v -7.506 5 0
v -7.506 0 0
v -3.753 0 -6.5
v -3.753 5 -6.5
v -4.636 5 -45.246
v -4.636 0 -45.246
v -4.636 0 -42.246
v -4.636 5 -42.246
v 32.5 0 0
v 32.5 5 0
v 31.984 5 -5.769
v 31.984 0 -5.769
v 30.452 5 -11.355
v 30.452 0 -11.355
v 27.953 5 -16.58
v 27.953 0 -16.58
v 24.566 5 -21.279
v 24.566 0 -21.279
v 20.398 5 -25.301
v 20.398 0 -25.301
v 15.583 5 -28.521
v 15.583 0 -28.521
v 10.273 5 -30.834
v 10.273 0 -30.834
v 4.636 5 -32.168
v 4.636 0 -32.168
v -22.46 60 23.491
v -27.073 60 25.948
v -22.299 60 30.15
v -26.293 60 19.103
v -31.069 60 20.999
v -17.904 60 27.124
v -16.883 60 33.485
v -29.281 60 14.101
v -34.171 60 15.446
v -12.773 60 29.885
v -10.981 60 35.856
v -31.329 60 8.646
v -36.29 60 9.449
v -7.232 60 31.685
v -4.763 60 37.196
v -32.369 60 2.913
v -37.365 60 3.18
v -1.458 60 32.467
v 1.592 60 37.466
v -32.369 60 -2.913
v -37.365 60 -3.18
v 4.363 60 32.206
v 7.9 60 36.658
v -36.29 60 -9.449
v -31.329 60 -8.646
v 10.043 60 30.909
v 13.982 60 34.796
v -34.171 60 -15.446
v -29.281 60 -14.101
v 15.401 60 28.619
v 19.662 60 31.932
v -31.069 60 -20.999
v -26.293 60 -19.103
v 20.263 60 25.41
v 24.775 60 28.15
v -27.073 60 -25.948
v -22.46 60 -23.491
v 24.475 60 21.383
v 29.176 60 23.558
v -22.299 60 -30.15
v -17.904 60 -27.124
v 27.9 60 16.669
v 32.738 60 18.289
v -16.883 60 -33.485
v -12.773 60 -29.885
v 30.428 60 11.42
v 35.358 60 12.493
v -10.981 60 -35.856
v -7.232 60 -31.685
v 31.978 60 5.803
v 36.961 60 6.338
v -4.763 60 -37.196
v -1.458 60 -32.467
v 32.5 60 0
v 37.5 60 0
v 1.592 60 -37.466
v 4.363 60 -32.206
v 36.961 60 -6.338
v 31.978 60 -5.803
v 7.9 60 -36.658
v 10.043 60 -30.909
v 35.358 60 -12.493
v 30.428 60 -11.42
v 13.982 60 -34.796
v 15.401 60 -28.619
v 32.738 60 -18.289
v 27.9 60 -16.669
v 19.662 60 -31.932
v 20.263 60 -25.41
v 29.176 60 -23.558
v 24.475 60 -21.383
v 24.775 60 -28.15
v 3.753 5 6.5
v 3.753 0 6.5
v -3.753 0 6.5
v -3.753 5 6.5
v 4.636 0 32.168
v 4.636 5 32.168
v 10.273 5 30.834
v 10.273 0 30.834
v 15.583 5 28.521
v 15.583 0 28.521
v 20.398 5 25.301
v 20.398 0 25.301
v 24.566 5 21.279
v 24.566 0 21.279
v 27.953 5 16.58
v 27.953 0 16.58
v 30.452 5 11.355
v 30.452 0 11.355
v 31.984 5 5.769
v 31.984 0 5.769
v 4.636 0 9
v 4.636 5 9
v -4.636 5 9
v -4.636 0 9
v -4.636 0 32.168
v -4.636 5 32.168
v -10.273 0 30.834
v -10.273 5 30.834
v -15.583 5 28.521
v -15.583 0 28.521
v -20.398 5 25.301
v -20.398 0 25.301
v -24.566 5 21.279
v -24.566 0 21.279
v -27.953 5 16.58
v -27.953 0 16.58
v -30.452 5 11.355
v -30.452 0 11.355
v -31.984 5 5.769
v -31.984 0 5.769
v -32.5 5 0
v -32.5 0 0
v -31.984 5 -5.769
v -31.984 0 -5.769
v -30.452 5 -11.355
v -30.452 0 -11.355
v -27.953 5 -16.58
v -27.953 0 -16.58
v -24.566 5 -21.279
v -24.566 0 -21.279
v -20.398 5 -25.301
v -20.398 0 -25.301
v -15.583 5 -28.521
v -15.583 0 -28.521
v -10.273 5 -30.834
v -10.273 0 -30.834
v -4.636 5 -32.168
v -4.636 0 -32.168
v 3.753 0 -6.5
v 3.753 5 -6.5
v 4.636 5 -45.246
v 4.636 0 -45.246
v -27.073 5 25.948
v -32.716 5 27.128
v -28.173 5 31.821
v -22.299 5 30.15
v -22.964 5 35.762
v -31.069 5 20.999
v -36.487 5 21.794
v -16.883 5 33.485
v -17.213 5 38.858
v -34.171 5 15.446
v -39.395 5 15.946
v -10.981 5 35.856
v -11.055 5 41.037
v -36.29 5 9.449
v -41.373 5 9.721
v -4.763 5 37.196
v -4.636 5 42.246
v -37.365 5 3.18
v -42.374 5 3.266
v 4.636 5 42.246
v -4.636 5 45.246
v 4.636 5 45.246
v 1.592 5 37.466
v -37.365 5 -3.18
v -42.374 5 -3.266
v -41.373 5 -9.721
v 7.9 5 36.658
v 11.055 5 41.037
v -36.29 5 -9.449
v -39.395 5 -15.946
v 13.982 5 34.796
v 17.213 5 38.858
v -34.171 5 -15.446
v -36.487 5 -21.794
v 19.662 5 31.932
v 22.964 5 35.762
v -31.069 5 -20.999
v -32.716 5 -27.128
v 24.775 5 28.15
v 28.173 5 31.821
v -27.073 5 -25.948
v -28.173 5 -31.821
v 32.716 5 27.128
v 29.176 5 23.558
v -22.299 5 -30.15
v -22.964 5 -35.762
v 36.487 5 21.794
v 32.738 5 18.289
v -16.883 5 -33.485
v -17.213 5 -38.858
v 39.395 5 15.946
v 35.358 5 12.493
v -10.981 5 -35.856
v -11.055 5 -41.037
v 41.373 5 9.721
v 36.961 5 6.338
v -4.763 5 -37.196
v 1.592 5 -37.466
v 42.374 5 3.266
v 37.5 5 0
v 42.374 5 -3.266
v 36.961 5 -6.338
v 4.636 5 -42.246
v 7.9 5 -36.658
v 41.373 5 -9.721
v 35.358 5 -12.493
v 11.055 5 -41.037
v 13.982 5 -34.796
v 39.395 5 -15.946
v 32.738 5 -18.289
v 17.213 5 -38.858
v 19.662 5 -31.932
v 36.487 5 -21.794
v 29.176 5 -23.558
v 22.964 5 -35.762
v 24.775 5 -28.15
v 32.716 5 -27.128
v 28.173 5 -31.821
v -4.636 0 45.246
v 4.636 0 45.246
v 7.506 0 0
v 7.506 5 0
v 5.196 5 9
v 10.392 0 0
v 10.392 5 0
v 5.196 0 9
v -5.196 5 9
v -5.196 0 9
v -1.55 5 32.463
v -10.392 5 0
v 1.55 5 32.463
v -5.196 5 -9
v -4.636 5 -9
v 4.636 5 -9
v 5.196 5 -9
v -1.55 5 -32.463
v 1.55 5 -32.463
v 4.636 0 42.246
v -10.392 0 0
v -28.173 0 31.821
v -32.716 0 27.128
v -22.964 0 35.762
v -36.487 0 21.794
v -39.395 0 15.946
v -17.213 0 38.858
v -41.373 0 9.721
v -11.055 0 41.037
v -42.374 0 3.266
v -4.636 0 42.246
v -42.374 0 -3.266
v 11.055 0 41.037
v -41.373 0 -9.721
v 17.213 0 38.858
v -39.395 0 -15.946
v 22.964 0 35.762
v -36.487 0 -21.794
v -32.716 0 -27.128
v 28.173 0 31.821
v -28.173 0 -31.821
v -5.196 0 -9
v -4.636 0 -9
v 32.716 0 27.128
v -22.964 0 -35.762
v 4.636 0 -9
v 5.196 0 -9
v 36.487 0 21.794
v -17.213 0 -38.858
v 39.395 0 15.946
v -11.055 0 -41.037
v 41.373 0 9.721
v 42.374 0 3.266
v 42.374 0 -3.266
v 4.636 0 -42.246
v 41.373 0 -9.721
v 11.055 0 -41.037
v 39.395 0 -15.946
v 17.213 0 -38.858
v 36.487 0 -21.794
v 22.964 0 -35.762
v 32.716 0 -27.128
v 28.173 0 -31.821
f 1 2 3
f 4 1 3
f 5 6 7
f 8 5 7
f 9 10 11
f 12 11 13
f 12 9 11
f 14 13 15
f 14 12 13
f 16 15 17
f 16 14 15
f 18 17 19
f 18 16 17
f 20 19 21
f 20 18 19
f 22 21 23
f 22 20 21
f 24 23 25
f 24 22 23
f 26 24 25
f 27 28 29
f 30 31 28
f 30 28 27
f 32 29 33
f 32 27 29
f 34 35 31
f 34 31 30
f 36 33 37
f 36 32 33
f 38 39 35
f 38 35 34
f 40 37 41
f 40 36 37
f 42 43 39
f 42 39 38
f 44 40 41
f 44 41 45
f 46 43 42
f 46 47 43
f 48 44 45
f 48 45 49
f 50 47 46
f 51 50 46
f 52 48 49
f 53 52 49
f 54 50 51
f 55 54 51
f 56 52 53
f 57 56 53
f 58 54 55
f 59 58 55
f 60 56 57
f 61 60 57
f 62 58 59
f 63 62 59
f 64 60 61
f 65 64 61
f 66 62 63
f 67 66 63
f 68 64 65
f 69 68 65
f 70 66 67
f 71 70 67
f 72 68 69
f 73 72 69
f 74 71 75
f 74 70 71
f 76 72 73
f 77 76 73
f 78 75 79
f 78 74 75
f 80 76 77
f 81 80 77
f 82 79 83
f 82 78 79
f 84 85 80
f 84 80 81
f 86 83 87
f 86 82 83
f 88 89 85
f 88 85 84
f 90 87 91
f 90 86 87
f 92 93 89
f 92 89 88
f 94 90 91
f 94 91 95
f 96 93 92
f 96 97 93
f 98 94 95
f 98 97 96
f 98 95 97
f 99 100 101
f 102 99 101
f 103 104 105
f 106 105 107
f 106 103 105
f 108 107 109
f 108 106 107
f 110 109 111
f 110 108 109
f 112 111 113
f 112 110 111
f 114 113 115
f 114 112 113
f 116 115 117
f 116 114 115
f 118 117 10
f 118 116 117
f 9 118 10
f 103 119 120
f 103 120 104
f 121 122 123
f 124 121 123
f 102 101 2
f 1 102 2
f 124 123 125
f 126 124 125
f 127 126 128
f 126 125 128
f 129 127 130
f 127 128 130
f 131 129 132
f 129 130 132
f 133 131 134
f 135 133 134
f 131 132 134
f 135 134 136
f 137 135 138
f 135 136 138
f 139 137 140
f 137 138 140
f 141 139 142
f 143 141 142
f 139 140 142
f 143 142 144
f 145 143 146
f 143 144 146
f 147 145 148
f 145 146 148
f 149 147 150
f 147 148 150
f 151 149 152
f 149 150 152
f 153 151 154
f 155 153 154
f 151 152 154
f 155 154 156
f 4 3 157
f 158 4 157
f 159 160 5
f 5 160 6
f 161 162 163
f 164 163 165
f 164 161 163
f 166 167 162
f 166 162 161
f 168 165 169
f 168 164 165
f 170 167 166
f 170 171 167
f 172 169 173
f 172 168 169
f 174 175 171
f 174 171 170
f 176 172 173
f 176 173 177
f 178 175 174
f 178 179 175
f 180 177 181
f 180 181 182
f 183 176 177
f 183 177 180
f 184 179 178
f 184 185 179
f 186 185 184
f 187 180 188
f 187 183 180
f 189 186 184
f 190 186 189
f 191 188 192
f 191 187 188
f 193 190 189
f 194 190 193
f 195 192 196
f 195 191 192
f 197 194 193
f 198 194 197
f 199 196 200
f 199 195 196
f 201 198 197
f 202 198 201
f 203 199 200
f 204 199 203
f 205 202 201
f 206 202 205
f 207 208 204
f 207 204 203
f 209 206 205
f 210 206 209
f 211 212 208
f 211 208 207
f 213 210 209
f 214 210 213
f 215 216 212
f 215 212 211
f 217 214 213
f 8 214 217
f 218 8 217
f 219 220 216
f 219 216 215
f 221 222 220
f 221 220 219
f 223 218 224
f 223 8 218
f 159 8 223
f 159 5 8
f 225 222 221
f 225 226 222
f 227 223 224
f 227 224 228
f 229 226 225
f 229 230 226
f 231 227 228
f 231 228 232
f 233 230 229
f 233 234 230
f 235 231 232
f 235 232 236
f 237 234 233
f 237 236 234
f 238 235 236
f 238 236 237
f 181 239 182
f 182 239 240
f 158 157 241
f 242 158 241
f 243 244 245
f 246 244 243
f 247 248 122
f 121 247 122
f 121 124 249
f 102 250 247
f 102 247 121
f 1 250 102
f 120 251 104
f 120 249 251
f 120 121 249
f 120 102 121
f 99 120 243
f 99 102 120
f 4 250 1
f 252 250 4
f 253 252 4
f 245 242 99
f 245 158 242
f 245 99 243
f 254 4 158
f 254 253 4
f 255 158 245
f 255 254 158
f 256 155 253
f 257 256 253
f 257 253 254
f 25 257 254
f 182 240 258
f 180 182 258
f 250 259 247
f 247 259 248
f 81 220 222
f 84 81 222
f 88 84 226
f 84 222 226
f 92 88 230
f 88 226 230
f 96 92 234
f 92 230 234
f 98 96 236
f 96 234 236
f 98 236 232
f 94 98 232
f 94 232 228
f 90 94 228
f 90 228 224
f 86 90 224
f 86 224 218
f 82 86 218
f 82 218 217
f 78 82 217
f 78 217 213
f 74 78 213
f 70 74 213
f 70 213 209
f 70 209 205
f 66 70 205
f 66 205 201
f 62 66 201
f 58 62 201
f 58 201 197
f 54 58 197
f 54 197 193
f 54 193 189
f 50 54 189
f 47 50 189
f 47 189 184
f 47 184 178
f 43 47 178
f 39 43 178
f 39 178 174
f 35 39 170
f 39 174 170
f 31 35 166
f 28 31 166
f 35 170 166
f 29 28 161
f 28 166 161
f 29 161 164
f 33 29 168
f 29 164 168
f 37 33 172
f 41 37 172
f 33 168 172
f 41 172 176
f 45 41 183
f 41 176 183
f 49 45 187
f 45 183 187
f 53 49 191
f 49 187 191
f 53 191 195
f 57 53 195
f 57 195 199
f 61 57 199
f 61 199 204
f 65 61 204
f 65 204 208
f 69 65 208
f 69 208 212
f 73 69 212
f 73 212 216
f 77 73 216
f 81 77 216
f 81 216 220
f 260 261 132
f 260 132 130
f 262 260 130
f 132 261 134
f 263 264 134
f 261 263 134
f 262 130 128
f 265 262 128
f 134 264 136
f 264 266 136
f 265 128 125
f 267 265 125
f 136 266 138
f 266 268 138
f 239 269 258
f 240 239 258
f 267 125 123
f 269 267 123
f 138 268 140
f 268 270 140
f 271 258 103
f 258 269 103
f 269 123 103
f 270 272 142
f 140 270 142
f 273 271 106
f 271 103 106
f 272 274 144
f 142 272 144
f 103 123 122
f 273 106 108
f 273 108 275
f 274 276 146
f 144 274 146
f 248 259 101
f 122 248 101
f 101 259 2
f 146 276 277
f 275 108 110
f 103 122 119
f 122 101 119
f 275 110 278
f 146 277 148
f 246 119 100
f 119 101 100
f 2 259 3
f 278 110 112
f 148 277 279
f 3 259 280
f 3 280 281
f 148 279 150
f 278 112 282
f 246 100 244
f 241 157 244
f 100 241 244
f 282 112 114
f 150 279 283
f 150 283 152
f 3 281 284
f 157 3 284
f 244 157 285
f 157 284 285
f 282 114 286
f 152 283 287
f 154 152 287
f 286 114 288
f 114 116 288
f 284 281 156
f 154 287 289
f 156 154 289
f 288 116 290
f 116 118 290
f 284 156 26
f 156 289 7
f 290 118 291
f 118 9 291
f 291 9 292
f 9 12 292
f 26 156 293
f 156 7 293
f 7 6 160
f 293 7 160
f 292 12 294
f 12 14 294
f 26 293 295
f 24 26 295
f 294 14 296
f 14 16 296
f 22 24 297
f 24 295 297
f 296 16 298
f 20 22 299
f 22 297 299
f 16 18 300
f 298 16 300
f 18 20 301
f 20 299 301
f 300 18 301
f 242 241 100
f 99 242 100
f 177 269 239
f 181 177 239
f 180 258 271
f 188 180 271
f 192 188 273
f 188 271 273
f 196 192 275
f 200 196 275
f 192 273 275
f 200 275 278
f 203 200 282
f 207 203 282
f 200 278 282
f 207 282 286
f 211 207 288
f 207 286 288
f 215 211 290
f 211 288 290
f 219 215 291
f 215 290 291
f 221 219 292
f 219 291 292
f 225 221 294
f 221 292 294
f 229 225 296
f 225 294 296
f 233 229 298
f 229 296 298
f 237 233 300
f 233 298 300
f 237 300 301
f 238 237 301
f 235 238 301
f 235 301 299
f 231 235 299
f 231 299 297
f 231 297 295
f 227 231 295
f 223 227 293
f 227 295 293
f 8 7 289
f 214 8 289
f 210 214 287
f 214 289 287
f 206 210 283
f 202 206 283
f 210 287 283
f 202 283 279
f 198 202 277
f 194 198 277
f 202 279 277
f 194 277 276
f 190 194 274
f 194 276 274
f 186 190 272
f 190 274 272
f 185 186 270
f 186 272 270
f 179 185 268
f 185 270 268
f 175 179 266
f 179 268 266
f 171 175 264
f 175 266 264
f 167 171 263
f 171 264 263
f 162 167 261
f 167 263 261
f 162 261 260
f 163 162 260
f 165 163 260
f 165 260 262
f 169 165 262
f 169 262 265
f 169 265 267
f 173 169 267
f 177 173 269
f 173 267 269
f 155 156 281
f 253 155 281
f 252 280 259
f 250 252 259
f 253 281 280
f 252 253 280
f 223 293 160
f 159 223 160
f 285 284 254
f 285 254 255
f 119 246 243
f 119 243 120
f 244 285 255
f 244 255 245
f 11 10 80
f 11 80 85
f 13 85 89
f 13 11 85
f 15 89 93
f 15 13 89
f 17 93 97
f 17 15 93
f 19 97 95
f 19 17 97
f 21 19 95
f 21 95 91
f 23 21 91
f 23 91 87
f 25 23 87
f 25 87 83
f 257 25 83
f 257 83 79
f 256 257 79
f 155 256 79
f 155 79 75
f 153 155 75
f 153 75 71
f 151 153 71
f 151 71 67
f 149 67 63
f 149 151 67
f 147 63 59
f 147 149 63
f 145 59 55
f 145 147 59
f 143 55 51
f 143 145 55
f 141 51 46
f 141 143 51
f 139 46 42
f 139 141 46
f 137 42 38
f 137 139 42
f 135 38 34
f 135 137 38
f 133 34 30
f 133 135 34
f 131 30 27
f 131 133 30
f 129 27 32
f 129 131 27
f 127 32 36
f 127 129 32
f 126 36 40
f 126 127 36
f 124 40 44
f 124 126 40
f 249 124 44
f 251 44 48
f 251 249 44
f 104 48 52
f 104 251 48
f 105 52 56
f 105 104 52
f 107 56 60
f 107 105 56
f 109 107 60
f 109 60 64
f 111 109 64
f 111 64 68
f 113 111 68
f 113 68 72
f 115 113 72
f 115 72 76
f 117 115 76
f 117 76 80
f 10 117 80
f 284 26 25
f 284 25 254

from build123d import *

# Parameters (mm, degrees)
BOSS_EXTRUDE3_DEPTH = 5
CUT_EXTRUDE1_DEPTH  = 6
SKETCH1_R           = 37.5
SKETCH1_R_2         = 32.5
BOSS_EXTRUDE4_DEPTH = 60


with BuildPart() as part:
    # Sketch4 → Boss-Extrude3 (new body)
    with BuildSketch(Plane(origin=(0, 0, 0), x_dir=(1, 0, 0), z_dir=(0, 1, 0))):
        with BuildLine():
            Line((-4.63627719, -42.246360007), (-4.63627719, -45.246360007))
            Line((-4.63627719, -45.246360007), (4.63627719, -45.246360007))
            Line((4.63627719, -45.246360007), (4.63627719, -42.246360007))
            ThreePointArc((4.63627719, -42.246360007), (42.5, 0), (4.63627719, 42.246360007))
            Line((4.63627719, 42.246360007), (4.63627719, 45.246360007))
            Line((4.63627719, 45.246360007), (-4.63627719, 45.246360007))
            Line((-4.63627719, 45.246360007), (-4.63627719, 42.246360007))
            ThreePointArc((-4.63627719, 42.246360007), (-42.5, 0), (-4.63627719, -42.246360007))
        make_face()
        with BuildLine():
            Line((-4.63627719, 32.167606902), (-4.63627719, 9))
            Line((-4.63627719, 9), (-5.196152423, 9))
            Line((-5.196152423, 9), (-10.392304845, 0))
            Line((-10.392304845, 0), (-5.196152423, -9))
            Line((-5.196152423, -9), (-4.63627719, -9))
            Line((-4.63627719, -9), (-4.63627719, -32.167606902))
            ThreePointArc((-4.63627719, -32.167606902), (-32.5, 0), (-4.63627719, 32.167606902))
        make_face(mode=Mode.SUBTRACT)
        with BuildLine():
            Line((4.63627719, 32.167606902), (4.63627719, 9))
            Line((4.63627719, 9), (5.196152423, 9))
            Line((5.196152423, 9), (10.392304845, 0))
            Line((10.392304845, 0), (5.196152423, -9))
            Line((5.196152423, -9), (4.63627719, -9))
            Line((4.63627719, -9), (4.63627719, -32.167606902))
            ThreePointArc((4.63627719, -32.167606902), (32.5, 0), (4.63627719, 32.167606902))
        make_face(mode=Mode.SUBTRACT)
    extrude(amount=BOSS_EXTRUDE3_DEPTH)

    # Sketch7 → Cut-Extrude1 (cut, through all)
    with BuildSketch(Plane(origin=(0, 0, 0), x_dir=(-1, 0, 0), z_dir=(0, -1, 0))):
        Polygon((-7.505553499, 0), (-3.75277675, -6.5), (3.75277675, -6.5), (7.505553499, 0), (3.75277675, 6.5), (-3.75277675, 6.5), align=None)
    extrude(amount=-CUT_EXTRUDE1_DEPTH, mode=Mode.SUBTRACT)

    # Sketch1 → Boss-Extrude4 (add)
    with BuildSketch(Plane(origin=(0, 0, 0), x_dir=(1, 0, 0), z_dir=(0, 1, 0))):
        Circle(SKETCH1_R)
        Circle(SKETCH1_R_2, mode=Mode.SUBTRACT)
    extrude(amount=BOSS_EXTRUDE4_DEPTH)


solid = part.part
